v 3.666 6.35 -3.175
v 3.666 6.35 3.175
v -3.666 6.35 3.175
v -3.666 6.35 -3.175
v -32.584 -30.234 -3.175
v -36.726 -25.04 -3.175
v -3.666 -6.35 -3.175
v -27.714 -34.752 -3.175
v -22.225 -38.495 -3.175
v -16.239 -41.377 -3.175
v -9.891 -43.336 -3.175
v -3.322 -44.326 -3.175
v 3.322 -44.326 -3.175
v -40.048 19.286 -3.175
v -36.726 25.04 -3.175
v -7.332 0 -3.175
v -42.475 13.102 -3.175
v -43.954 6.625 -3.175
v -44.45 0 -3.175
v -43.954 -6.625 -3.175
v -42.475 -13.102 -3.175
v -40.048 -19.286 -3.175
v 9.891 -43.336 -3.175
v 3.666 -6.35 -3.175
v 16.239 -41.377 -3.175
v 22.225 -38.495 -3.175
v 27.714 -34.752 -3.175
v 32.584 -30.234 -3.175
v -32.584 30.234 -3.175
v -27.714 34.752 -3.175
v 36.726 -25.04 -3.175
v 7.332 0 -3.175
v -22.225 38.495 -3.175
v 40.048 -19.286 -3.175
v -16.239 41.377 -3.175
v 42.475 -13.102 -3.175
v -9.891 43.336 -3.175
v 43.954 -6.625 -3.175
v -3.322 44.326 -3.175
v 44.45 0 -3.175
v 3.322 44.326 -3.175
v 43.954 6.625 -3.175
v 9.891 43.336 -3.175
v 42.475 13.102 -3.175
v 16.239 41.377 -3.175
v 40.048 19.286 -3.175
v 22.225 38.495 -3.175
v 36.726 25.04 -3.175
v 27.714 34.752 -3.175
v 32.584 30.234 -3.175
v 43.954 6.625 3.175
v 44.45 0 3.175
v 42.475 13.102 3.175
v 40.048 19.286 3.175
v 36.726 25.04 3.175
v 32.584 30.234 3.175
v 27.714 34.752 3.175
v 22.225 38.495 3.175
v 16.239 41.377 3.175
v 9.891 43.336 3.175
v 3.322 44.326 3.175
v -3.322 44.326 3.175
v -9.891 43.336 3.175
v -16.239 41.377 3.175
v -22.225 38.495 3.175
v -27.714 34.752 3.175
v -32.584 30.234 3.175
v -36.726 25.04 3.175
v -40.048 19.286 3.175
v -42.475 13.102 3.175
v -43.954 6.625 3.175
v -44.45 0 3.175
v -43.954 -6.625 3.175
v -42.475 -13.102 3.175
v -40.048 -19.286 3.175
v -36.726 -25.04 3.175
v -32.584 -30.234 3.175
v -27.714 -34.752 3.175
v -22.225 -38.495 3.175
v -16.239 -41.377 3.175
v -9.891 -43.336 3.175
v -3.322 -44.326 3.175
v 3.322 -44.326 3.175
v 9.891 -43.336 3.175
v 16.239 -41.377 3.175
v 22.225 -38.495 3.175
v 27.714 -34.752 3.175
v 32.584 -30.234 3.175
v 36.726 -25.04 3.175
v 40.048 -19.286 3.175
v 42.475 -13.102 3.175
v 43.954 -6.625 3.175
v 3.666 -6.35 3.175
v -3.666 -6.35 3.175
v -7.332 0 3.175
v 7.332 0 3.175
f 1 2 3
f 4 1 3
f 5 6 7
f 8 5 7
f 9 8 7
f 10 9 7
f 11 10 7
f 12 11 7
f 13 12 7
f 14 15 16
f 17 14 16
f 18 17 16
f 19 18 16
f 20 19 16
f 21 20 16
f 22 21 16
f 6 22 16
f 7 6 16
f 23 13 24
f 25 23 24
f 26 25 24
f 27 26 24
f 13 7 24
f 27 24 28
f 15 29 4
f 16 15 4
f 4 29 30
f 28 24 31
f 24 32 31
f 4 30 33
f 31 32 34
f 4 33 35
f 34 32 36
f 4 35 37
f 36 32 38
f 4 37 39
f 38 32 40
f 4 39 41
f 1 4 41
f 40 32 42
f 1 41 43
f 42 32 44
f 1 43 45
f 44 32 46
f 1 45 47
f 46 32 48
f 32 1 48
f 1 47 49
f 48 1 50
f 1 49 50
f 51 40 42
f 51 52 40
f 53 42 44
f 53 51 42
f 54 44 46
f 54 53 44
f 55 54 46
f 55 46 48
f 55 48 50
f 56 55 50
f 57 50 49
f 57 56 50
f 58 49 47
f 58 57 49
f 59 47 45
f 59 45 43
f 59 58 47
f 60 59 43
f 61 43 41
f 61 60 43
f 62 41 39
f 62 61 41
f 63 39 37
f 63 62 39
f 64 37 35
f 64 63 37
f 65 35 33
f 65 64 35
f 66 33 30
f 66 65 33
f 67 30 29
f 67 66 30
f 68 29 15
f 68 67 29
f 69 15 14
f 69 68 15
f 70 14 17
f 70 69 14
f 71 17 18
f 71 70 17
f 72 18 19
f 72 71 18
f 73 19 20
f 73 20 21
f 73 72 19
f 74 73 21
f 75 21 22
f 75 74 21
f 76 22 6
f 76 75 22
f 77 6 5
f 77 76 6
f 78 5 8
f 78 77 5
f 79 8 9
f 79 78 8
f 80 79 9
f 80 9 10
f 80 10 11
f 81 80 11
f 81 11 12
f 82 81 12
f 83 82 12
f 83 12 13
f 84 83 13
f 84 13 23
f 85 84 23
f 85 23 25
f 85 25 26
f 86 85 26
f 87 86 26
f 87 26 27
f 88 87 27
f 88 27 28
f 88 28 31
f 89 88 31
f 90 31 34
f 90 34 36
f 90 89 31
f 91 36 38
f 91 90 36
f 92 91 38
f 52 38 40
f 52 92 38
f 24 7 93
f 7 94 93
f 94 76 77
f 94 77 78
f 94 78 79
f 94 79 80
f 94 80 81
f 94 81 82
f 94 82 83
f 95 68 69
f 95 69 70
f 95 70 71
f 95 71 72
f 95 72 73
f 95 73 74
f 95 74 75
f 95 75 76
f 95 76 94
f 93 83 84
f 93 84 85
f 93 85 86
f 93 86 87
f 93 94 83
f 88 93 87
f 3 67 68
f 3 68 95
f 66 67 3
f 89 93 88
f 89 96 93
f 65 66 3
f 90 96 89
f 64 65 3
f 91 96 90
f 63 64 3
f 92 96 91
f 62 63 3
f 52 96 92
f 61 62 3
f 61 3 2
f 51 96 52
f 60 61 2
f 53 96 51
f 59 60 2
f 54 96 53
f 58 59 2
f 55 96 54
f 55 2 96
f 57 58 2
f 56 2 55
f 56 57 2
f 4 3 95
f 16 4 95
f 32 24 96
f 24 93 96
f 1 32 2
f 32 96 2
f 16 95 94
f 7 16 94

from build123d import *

# Parameters (mm, degrees)
SKETCH1_R           = 44.45
BOSS_EXTRUDE1_DEPTH = 3.175
CUT_EXTRUDE1_DEPTH  = 3.175


with BuildPart() as part:
    # Sketch1 → Boss-Extrude1 (new body, symmetric)
    with BuildSketch(Plane.XY):
        Circle(SKETCH1_R)
    extrude(amount=BOSS_EXTRUDE1_DEPTH, both=True)

    # Sketch2 → Cut-Extrude1 (cut, symmetric)
    with BuildSketch(Plane.XY):
        Polygon((7.332348419, 0), (3.666174209, 6.35), (-3.666174209, 6.35), (-7.332348419, 0), (-3.666174209, -6.35), (3.666174209, -6.35), align=None)
    extrude(amount=CUT_EXTRUDE1_DEPTH, both=True, mode=Mode.SUBTRACT)


solid = part.part
